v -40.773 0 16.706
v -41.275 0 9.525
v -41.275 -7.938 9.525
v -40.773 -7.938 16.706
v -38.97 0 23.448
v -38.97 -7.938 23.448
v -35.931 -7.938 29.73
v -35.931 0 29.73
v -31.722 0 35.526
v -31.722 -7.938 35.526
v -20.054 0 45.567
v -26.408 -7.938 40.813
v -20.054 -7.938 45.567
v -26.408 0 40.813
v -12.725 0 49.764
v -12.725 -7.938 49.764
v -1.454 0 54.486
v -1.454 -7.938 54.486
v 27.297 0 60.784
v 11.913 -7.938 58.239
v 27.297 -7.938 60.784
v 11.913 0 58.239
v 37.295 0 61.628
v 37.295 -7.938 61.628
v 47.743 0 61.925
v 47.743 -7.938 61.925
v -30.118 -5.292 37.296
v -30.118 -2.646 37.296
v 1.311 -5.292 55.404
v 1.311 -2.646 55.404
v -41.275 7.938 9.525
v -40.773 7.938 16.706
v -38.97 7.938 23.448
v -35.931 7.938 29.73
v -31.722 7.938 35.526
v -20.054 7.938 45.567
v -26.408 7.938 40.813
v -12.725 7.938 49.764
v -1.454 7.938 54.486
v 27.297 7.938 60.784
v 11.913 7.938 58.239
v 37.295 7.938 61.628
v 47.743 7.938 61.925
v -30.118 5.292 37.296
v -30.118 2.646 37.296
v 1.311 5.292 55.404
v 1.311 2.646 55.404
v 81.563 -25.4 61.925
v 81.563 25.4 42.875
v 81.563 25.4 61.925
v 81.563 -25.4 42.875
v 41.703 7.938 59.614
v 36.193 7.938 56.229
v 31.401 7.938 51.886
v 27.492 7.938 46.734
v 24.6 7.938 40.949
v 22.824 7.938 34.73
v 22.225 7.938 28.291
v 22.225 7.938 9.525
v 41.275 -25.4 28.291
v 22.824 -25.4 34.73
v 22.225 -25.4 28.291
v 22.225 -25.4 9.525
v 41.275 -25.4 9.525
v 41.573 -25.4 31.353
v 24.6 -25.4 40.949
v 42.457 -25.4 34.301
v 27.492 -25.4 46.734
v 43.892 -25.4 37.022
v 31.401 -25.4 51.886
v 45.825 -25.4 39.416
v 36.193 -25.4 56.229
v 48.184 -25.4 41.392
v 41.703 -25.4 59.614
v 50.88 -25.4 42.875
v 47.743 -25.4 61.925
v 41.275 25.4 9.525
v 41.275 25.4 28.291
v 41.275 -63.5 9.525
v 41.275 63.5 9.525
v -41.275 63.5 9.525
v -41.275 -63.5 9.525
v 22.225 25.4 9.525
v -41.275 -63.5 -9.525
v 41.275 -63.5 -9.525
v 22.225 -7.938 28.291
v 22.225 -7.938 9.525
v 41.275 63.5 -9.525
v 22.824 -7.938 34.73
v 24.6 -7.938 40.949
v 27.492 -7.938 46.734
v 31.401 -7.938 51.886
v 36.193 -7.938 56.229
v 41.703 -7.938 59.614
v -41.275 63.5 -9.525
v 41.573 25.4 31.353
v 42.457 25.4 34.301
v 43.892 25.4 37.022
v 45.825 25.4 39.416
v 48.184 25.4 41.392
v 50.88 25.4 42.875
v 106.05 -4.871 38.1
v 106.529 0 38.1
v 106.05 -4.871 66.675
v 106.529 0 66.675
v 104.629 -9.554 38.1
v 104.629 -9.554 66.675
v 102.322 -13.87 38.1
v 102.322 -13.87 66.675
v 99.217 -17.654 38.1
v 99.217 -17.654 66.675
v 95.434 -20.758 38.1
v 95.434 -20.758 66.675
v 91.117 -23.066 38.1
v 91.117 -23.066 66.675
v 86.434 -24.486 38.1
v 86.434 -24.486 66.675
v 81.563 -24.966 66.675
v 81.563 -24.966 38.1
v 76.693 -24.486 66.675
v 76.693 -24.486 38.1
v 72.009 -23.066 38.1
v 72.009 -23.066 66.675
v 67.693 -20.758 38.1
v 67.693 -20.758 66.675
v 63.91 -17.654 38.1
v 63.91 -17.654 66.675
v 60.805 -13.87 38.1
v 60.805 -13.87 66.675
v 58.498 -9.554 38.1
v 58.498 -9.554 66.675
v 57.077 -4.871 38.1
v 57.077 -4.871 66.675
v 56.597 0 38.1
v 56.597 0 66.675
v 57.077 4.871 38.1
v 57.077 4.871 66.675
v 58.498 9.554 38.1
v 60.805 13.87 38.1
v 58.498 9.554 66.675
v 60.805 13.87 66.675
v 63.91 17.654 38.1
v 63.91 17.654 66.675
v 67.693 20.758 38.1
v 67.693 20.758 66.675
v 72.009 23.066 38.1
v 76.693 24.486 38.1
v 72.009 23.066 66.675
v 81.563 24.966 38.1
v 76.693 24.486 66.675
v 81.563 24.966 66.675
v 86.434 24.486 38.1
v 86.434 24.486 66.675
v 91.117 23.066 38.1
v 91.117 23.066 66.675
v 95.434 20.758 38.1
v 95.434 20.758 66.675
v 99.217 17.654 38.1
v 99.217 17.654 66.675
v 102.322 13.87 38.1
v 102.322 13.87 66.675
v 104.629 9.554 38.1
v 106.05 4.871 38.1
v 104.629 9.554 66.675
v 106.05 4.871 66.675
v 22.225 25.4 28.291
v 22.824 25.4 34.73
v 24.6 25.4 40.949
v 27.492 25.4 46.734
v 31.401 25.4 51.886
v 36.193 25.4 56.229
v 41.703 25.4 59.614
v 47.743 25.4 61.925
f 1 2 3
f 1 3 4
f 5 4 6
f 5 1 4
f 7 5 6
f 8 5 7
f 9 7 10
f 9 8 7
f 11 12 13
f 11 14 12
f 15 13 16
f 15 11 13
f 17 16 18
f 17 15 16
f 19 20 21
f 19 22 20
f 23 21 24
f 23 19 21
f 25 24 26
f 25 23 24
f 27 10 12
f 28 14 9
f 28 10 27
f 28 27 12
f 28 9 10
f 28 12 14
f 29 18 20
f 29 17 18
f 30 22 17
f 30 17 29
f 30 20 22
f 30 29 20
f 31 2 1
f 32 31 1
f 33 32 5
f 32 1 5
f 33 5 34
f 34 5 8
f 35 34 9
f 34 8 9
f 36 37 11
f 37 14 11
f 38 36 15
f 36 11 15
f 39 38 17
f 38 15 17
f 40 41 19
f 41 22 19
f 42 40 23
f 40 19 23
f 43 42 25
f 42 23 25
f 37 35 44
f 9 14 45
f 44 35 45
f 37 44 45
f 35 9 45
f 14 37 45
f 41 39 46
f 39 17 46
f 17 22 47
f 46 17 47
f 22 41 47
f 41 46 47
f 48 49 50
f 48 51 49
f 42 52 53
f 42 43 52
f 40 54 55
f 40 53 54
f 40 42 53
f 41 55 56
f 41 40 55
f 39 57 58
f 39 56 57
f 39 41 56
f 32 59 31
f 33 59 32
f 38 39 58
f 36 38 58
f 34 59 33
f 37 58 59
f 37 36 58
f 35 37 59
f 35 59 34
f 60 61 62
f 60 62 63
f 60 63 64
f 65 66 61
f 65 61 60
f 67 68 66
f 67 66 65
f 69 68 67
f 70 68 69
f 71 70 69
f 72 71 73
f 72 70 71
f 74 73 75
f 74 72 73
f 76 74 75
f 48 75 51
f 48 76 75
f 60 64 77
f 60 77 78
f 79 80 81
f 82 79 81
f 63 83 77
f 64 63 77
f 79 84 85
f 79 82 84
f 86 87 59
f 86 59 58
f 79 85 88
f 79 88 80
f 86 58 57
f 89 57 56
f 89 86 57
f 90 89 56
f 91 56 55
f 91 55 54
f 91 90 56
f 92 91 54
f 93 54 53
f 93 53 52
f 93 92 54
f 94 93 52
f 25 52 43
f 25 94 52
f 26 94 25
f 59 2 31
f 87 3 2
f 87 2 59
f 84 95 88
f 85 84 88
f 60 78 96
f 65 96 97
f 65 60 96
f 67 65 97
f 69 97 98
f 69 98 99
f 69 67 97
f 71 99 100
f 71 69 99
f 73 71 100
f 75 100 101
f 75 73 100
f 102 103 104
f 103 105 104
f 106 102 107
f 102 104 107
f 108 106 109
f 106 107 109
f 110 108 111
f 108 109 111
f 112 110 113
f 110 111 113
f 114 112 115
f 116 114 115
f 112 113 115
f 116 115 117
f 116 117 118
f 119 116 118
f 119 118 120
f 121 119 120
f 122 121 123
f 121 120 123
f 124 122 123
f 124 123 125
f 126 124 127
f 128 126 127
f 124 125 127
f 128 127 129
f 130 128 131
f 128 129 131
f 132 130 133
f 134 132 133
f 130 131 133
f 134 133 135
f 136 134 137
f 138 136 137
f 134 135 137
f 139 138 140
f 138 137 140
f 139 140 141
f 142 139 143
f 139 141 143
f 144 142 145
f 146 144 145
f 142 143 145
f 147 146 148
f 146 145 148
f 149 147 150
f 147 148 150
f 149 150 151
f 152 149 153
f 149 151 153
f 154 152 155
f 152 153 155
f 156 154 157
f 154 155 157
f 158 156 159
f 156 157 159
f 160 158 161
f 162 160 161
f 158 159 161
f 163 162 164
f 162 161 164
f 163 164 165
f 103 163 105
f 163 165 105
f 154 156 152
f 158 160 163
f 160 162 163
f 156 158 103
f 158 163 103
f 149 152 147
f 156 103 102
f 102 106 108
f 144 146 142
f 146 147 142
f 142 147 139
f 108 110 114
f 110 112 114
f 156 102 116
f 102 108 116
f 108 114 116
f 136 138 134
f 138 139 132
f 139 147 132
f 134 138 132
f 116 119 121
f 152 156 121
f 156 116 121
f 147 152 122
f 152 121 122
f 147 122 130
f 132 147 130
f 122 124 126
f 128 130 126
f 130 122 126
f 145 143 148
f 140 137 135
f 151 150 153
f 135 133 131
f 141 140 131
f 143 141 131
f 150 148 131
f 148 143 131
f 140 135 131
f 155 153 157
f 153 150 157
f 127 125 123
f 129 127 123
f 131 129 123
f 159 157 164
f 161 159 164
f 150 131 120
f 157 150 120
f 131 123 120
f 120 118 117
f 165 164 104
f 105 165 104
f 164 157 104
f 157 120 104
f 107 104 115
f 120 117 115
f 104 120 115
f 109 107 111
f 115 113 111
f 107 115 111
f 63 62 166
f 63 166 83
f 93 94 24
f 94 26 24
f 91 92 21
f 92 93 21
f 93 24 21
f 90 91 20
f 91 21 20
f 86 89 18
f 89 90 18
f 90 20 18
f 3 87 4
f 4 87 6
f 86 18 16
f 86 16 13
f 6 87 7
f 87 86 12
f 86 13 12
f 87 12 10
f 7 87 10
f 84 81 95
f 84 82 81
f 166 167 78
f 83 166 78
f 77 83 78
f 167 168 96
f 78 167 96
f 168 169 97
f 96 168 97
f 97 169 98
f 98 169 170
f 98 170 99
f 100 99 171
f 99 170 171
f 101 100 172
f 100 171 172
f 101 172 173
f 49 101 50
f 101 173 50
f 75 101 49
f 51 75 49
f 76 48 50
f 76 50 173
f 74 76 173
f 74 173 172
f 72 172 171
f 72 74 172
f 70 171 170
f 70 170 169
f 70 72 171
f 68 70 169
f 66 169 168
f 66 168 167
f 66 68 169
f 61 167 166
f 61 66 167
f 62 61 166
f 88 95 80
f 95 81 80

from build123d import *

# Parameters (mm, degrees)
F1_DEPTH = 63.5
F0_W     = 25.8340687361
F0_H     = 19.0500002888
F2_DEPTH = 25.4
F3_DEPTH = 7.9375


with BuildPart() as f1:
    # F0 (on Front) → F1 (new body, symmetric)
    with BuildSketch(Plane.XZ):
        Polygon((-41.275, -9.525), (41.275, -9.525), (41.275, 9.525), (22.2249997112, 9.525), (-41.275, 9.525), align=None)
    extrude(amount=F1_DEPTH, both=True)


with BuildPart() as f2:
    # F0 (on Front) → F2 (new body, symmetric)
    with BuildSketch(Plane.XZ):
        with Locations((68.6463132568, 52.4002001444)):
            Rectangle(F0_W, F0_H)
        with BuildLine():
            Line((22.2249997112, 9.525), (41.275, 9.525))
            Line((41.275, 9.525), (41.275, 28.2908508954))
            ThreePointArc((41.275, 28.2908508954), (43.8919604664, 37.0224036053), (50.8800409734, 42.8752))
            Line((50.8800409734, 42.8752), (55.7292788887, 42.8752))
            Line((55.7292788887, 42.8752), (55.7292788887, 61.9252002888))
            Line((55.7292788887, 61.9252002888), (47.7432903704, 61.9252002888))
            ThreePointArc((47.7432903704, 61.9252002888), (29.3265837675, 49.4004021535), (22.2249997112, 28.2908508954))
            Line((22.2249997112, 28.2908508954), (22.2249997112, 9.525))
        make_face()
    extrude(amount=F2_DEPTH, both=True)


with BuildPart() as f3:
    # F0 (on Front) → F3 (new body, symmetric)
    with BuildSketch(Plane.XZ):
        with BuildLine():
            add(Edge.make_bspline(
                [(-41.275, 9.525), (-42.008638382, 41.4867997169), (-4.4356905855, 61.8388131261), (47.7432903704, 61.9252002888)],
                knots=[0, 0, 0, 0, 103.2958712185, 103.2958712185, 103.2958712185, 103.2958712185], degree=3))
            Line((-41.275, 9.525), (22.2249997112, 9.525))
            Line((22.2249997112, 9.525), (22.2249997112, 28.2908508954))
            ThreePointArc((22.2249997112, 28.2908508954), (29.3265837675, 49.4004021535), (47.7432903704, 61.9252002888))
        make_face()
    extrude(amount=F3_DEPTH, both=True)


with BuildPart() as f4:
    # F0 (on Front) → F4 (revolve)
    with BuildSketch(Plane.XZ):
        Polygon((81.5633476248, 66.675), (81.5633476248, 61.9252002888), (81.5633476248, 42.8752), (81.5633476248, 38.1), (106.5292788887, 38.1), (106.5292788887, 66.675), align=None)
    revolve(axis=Axis((81.5633476248, 0, 52.3875), (0, 0, -1)))


solid = Compound([f1.part, f2.part, f3.part, f4.part])
